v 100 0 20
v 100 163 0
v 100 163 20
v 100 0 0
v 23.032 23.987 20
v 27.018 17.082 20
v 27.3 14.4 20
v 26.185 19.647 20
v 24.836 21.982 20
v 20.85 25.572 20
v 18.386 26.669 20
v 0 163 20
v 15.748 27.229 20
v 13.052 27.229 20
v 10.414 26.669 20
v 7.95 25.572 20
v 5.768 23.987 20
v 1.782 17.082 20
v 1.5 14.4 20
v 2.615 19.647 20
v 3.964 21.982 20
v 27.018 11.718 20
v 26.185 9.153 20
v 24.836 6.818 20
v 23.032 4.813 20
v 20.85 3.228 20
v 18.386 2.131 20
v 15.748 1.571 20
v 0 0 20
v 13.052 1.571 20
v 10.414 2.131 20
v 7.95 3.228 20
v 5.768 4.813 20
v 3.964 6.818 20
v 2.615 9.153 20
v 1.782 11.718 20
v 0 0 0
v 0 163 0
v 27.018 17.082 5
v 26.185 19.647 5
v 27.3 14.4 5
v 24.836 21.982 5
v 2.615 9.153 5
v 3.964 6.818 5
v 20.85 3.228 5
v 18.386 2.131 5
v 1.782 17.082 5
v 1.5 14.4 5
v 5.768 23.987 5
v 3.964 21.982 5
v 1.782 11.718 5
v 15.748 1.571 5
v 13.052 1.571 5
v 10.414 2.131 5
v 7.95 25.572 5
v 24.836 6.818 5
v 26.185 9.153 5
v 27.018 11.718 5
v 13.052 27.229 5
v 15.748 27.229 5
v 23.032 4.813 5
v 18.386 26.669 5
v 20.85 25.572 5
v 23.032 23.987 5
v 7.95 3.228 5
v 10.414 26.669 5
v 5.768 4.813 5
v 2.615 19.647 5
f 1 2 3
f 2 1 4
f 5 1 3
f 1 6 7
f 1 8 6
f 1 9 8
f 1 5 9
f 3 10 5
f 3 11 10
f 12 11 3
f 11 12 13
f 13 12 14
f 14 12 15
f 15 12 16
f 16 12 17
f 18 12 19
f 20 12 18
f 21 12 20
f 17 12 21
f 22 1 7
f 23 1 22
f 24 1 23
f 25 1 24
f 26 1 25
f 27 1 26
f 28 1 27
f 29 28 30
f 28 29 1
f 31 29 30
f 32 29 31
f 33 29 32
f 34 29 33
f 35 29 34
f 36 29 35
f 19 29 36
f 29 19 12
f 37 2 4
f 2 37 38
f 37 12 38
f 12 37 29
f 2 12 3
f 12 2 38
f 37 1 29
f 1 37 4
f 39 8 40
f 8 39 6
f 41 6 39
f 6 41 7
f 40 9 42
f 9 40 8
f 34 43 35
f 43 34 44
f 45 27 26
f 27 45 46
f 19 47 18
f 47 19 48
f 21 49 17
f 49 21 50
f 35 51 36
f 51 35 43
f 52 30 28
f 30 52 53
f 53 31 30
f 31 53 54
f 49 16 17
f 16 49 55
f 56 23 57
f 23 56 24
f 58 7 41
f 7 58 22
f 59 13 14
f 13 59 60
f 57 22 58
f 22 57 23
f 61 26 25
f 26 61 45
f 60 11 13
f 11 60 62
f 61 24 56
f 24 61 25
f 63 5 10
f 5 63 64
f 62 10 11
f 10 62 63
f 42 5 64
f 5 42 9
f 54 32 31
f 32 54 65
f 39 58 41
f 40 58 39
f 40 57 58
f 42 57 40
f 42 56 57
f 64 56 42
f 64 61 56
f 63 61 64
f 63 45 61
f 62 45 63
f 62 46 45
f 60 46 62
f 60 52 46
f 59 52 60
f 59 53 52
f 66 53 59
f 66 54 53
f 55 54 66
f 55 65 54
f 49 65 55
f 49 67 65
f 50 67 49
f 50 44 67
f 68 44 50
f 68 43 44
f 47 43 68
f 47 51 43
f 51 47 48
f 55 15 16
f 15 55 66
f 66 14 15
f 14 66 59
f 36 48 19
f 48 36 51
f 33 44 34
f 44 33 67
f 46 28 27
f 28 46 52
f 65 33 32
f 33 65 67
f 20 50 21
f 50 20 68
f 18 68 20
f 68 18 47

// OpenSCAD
box_x=100;
box_y=163;
box_z=20;

ml19=25.8;
ml18=25.8;
ml17=23.8;
ml16=21.8;
ml15=21.8;

hole_z=15;

pad=0.1;

wall=1.5;

module hole(hole_d,center_d) {
    translate([hole_d/2+wall,hole_d/2+wall,box_z-hole_z])
    cylinder(d=hole_d,h=hole_z+pad);
    
}

difference() {
    cube([box_x,box_y,box_z]);
    hole(ml19,0);

}
